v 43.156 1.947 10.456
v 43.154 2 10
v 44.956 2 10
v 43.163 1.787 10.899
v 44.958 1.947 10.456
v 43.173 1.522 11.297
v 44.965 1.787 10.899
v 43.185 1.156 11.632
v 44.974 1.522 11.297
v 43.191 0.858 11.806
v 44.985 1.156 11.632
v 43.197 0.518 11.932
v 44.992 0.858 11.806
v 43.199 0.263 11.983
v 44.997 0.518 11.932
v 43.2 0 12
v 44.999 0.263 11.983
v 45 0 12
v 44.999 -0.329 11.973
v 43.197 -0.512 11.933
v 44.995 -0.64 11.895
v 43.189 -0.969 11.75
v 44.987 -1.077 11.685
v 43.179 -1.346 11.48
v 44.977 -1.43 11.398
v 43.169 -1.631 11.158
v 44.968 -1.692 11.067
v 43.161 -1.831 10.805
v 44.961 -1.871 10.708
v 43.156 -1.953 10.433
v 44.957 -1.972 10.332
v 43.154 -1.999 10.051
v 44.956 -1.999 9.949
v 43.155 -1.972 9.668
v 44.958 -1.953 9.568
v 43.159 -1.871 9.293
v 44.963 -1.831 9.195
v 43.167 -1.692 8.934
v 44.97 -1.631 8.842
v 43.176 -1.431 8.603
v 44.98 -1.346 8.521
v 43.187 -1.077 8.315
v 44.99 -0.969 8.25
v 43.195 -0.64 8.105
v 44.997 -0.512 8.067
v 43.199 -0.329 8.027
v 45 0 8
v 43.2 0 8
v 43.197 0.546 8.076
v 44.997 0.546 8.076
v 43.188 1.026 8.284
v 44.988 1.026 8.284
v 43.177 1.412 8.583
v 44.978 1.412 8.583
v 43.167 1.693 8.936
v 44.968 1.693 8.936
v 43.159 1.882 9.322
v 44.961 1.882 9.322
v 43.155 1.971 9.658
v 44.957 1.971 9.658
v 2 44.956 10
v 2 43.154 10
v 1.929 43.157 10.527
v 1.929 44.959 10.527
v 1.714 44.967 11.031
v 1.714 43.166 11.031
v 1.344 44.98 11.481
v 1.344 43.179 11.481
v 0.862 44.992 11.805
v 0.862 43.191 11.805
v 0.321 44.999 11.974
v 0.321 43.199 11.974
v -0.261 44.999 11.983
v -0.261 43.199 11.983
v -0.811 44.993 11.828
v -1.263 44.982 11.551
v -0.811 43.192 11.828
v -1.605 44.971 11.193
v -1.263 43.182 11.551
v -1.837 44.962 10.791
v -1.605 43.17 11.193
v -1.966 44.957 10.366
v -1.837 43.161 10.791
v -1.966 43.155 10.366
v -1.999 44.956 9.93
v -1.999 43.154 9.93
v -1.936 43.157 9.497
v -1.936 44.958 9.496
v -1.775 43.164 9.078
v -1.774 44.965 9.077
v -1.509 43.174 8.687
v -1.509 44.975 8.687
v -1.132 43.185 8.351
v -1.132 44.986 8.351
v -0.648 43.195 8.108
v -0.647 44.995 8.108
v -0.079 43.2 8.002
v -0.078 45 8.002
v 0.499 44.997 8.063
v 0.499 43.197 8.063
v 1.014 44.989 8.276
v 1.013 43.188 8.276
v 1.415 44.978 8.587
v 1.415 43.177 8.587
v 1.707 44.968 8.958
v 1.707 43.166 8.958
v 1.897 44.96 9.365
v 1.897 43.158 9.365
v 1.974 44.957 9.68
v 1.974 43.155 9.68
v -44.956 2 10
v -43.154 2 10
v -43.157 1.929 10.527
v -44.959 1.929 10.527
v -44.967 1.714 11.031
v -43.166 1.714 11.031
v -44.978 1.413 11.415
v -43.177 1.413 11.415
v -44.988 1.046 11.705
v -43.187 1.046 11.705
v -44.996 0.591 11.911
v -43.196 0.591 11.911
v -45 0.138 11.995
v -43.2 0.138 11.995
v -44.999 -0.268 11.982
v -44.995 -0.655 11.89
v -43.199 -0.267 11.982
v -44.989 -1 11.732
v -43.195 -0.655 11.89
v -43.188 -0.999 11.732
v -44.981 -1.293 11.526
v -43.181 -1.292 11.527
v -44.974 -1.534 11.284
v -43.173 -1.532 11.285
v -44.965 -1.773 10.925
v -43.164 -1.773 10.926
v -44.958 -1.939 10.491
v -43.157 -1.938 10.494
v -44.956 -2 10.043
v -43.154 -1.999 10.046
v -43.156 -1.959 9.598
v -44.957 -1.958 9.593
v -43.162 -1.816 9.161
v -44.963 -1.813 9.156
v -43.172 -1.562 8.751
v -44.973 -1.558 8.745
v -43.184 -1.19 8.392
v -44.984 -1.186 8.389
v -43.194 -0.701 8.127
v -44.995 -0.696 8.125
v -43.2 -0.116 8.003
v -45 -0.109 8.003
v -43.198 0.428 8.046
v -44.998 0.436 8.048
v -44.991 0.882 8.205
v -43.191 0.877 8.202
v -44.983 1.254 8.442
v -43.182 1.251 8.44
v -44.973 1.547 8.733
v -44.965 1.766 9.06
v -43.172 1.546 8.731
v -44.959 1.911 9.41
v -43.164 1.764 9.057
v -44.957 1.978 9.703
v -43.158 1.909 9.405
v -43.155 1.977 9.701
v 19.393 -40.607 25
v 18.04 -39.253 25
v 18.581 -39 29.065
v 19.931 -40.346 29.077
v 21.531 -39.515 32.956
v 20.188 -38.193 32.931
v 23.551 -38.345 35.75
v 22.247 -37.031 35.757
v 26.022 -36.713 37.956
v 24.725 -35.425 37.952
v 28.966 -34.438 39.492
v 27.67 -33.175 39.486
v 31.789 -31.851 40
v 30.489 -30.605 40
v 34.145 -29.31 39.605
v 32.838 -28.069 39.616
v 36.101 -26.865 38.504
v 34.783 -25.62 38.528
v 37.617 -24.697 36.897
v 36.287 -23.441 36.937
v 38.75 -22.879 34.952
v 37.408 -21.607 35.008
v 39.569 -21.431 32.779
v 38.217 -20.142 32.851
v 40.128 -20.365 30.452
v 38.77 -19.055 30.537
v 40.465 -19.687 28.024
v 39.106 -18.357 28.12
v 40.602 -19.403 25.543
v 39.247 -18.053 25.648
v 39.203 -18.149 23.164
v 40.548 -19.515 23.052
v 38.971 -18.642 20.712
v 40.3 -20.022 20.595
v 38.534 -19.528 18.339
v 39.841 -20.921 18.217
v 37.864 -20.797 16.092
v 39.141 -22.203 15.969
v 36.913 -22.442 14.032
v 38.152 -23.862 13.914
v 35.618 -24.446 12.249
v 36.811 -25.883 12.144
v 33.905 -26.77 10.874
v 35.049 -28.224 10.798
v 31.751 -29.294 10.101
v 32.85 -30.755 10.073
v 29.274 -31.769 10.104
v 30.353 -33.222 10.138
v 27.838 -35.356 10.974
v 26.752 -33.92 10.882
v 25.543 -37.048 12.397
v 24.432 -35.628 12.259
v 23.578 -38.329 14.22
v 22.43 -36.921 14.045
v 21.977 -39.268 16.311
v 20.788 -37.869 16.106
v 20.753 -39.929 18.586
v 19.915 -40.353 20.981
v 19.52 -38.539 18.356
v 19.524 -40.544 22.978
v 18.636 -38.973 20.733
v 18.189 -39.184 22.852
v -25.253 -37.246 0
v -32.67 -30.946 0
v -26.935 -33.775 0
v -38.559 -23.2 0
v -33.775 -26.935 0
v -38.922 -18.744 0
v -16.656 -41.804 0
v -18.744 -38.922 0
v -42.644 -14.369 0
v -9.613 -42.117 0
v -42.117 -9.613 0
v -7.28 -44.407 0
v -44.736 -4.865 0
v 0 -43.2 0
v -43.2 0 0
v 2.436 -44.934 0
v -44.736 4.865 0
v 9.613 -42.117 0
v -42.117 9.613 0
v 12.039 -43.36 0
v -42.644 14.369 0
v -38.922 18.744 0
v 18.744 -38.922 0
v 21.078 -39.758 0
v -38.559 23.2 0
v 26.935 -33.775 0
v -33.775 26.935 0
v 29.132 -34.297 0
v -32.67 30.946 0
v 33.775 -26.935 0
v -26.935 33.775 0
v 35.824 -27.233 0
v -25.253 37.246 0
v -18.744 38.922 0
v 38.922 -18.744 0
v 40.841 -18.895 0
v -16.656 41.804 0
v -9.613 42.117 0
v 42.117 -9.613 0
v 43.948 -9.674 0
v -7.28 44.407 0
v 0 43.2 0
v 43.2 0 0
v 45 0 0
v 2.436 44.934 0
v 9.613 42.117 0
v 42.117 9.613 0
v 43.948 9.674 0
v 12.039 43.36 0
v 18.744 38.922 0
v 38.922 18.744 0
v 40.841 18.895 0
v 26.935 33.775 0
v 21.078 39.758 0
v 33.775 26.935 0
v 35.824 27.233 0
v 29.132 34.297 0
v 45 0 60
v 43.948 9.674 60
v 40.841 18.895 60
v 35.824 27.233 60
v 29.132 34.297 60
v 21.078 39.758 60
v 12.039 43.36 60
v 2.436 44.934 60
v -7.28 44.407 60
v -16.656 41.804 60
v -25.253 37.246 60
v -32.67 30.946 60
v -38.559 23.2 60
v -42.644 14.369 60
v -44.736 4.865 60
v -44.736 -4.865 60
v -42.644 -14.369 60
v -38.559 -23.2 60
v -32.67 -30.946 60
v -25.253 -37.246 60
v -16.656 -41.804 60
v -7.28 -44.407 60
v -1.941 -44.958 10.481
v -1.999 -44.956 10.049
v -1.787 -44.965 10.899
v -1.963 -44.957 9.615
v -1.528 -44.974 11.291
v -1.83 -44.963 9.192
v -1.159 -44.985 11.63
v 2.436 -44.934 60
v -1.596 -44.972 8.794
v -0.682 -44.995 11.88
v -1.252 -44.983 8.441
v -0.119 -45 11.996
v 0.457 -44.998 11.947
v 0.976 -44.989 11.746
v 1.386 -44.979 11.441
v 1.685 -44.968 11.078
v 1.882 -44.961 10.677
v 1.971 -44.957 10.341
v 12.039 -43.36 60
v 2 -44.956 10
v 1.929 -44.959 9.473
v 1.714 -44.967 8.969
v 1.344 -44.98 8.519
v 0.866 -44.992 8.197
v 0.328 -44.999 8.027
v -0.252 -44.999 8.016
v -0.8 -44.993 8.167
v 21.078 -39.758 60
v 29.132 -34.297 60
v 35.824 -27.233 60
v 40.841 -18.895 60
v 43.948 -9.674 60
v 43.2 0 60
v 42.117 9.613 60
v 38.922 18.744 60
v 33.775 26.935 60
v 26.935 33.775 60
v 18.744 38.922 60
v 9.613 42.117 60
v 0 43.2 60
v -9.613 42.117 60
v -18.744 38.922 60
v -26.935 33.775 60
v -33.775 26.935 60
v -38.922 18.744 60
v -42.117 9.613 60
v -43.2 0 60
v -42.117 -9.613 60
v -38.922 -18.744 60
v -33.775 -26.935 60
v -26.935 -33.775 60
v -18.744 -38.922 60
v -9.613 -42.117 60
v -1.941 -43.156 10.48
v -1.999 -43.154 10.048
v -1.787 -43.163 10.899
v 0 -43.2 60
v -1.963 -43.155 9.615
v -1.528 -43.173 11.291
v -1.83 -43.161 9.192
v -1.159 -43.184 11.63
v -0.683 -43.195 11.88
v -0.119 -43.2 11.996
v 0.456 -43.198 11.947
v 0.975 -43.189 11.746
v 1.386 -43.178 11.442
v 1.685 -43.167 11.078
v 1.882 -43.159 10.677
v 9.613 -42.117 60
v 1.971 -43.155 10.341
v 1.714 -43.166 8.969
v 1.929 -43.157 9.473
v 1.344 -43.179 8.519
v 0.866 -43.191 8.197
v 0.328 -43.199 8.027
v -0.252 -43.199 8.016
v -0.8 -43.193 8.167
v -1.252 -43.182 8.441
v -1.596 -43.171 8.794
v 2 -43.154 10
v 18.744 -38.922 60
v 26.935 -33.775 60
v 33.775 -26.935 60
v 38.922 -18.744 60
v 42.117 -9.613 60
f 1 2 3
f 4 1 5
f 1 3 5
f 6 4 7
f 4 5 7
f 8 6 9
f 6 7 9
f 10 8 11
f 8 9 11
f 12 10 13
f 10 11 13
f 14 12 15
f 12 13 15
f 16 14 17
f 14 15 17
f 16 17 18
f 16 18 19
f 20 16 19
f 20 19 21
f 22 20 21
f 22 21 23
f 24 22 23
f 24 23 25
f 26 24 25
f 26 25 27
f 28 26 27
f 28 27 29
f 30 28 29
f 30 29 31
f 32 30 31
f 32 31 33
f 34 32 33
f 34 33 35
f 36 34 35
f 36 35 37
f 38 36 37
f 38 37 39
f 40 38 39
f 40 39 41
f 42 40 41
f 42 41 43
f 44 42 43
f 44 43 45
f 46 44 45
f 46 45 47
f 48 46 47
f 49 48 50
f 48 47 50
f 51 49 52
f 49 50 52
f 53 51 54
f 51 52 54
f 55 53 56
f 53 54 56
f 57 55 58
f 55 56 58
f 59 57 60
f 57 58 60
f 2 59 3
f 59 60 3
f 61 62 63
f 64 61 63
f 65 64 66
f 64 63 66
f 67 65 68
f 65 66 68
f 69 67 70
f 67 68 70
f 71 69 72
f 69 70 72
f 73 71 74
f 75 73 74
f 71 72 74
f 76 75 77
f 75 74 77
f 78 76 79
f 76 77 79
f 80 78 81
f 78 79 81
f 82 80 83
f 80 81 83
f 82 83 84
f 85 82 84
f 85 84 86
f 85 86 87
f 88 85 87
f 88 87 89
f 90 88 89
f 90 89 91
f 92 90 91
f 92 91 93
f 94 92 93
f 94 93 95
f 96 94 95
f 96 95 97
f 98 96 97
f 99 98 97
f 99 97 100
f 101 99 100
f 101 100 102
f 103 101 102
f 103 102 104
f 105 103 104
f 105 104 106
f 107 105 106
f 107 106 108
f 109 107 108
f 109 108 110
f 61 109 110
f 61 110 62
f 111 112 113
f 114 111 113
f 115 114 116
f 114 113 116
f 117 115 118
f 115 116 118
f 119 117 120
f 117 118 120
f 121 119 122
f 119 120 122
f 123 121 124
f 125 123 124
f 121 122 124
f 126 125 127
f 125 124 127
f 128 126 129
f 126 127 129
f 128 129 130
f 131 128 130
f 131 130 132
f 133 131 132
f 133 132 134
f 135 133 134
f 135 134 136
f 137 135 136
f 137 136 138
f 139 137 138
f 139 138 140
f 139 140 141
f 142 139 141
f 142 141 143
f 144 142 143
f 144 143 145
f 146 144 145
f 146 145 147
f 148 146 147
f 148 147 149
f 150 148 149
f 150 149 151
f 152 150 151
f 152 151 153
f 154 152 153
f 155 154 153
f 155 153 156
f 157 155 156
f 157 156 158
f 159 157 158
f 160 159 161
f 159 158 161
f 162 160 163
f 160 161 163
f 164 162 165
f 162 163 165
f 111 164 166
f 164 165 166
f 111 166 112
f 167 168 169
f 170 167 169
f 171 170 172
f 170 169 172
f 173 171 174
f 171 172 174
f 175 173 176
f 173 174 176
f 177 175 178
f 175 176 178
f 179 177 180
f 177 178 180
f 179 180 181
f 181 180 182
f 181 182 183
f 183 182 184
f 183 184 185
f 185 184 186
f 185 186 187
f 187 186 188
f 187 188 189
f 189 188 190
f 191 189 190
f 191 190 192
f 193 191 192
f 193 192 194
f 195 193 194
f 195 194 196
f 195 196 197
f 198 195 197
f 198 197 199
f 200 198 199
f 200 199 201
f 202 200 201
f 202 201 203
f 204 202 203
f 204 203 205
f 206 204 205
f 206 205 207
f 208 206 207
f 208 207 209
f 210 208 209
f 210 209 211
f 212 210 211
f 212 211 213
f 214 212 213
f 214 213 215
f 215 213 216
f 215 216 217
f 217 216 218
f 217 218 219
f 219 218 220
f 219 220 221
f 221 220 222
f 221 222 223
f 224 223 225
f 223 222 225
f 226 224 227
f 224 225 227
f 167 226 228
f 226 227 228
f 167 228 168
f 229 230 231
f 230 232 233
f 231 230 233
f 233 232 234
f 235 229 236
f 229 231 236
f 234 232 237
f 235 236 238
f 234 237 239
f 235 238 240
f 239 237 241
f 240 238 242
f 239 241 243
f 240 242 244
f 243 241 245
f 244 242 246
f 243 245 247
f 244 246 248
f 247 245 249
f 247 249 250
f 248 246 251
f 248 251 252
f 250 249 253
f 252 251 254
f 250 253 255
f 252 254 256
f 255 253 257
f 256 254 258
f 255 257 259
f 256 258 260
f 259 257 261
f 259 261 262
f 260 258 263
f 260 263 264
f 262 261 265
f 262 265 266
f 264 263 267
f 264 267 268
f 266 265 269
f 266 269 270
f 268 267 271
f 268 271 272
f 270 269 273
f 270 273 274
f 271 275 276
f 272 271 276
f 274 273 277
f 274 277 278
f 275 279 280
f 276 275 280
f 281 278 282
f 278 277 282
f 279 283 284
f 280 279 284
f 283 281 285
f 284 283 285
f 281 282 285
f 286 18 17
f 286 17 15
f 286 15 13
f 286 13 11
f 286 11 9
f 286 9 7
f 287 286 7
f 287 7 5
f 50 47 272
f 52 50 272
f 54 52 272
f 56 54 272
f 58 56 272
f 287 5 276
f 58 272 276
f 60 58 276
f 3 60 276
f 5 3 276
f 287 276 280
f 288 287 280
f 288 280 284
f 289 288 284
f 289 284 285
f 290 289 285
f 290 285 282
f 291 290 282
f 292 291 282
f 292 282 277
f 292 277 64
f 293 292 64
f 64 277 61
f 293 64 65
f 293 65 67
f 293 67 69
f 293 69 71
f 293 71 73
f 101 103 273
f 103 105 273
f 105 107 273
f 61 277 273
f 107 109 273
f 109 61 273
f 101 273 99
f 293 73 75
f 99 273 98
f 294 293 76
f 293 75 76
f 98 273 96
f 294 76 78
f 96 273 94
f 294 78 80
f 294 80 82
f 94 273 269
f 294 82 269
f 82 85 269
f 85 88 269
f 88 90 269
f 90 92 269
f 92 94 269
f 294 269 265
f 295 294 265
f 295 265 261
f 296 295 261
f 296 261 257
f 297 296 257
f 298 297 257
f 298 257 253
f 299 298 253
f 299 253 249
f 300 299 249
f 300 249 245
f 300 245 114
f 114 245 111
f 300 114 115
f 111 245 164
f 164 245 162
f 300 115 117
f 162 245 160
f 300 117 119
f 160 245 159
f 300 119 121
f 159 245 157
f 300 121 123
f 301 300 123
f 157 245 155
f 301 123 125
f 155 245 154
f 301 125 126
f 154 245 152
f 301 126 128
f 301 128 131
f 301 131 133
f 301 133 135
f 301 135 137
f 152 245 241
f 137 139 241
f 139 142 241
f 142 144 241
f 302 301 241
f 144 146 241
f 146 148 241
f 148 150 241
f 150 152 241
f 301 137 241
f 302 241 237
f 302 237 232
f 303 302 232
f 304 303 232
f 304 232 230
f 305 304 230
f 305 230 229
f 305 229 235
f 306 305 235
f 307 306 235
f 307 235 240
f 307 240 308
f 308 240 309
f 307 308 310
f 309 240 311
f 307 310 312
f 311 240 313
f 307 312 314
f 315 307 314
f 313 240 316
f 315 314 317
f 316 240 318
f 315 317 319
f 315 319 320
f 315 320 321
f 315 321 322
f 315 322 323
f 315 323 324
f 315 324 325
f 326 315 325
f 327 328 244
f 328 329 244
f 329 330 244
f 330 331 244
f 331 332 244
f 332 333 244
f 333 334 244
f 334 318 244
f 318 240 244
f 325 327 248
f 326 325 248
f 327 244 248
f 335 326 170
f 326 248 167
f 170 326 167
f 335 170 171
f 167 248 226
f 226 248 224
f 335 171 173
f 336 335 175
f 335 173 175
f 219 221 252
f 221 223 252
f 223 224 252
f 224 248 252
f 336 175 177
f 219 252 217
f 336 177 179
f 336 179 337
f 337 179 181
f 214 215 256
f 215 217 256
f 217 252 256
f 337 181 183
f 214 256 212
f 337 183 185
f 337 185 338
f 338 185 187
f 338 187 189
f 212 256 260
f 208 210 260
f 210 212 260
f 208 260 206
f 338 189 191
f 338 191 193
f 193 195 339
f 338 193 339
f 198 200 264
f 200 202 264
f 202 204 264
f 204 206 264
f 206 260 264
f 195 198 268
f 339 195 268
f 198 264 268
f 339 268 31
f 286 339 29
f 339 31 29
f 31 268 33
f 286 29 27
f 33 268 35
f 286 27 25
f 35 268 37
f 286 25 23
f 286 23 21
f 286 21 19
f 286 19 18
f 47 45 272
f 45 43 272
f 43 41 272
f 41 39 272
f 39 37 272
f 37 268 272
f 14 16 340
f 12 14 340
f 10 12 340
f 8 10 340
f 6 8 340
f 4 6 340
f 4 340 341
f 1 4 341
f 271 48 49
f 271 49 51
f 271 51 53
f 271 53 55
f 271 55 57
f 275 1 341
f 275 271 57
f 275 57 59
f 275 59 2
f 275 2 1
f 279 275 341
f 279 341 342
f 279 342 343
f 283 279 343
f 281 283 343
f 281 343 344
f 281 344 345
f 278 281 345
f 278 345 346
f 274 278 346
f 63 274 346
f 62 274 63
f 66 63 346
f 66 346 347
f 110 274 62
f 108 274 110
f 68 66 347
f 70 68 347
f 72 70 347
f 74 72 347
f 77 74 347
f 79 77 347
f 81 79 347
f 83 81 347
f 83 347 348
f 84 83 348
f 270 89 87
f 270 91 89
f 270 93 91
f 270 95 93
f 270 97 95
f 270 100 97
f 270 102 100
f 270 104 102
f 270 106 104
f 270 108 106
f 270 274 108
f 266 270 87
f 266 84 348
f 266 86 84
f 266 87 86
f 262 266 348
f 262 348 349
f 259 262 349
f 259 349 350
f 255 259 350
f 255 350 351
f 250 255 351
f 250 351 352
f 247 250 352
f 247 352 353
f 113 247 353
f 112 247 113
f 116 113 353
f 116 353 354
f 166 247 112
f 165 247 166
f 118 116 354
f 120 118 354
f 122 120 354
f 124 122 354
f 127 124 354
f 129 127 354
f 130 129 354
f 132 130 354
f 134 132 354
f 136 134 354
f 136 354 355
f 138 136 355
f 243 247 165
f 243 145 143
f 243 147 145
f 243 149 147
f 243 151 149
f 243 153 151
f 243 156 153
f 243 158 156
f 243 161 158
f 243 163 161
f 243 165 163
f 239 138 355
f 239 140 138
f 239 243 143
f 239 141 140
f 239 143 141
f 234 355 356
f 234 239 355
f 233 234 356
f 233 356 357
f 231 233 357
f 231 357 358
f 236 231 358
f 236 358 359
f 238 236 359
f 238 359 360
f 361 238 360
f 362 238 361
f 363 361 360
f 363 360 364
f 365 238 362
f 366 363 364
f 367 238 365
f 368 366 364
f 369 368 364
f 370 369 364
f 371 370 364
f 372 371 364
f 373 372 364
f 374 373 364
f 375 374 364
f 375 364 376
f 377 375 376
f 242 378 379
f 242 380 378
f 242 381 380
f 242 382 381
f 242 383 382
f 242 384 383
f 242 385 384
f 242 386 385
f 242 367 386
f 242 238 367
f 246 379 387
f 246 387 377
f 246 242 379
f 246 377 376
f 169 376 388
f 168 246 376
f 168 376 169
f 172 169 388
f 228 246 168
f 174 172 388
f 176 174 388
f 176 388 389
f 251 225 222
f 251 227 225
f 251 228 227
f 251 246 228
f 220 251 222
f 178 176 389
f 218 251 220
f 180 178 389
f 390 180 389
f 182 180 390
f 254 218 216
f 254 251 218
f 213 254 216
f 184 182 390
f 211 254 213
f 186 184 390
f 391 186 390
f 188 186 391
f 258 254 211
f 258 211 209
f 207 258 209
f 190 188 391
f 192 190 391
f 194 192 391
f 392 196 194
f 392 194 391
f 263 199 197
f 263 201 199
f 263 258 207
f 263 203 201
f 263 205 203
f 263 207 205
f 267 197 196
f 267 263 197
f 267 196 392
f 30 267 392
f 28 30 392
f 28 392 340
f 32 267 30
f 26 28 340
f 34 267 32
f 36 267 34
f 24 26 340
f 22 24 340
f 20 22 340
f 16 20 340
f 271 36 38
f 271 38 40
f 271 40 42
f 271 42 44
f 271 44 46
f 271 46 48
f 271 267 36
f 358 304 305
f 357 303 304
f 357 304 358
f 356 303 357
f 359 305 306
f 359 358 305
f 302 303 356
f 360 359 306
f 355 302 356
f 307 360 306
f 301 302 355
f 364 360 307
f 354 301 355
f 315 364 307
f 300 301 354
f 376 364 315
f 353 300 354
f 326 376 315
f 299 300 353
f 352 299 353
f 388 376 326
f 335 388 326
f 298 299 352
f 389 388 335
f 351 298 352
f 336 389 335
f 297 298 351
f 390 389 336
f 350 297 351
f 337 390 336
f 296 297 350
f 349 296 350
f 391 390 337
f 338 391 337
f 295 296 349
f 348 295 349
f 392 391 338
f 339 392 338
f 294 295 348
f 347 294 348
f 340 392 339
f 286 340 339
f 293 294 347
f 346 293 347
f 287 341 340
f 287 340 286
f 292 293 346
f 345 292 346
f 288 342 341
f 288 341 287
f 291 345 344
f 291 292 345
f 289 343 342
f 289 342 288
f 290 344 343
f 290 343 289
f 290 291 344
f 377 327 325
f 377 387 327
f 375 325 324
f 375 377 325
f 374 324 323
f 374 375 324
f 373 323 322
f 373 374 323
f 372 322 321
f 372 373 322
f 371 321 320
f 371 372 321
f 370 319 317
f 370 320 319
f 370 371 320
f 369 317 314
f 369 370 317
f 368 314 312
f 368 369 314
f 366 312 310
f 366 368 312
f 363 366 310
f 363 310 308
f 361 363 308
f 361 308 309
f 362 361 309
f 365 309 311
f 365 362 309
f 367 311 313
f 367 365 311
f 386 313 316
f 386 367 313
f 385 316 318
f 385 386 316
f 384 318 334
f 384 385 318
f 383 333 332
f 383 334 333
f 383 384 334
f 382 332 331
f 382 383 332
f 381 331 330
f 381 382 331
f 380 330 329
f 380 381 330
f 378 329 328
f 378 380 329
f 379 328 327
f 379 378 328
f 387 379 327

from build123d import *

# Parameters (mm, degrees)
TUBE_R             = 45
TUBE_R_2           = 43.2
TUBE_DEPTH         = 60
SKETCH_R           = 2
POCKET_DEPTH       = 326.425946
POCKET_DEPTH_BACK  = 326.425946
POLARPATTERN_COUNT = 4
SKETCH003_R        = 15
POCKET001_DEPTH    = 63.64061


with BuildPart() as part:
    # Tube → Tube (new body)
    with BuildSketch(Plane.XY):
        Circle(TUBE_R)
        Circle(TUBE_R_2, mode=Mode.SUBTRACT)
    extrude(amount=TUBE_DEPTH)

    # Sketch → Pocket (cut, two sides)
    with BuildSketch(Plane.XZ) as pocket_sk:
        with Locations((0, 10)):
            Circle(SKETCH_R)
    pocket = extrude(amount=-POCKET_DEPTH, mode=Mode.SUBTRACT) + extrude(pocket_sk.sketch, amount=POCKET_DEPTH_BACK, mode=Mode.SUBTRACT)

    # PolarPattern: Pocket ×4 about axis
    polarpattern_axis = Axis((0, 0, 0), (0, 0, 1))
    for i in range(1, POLARPATTERN_COUNT):
        add(pocket.rotate(polarpattern_axis, i * 360 / POLARPATTERN_COUNT), mode=Mode.SUBTRACT)

    # Sketch003 → Pocket001 (cut, through all)
    with BuildSketch(Plane(origin=(0, 0, 0), x_dir=(-0.707107, -0.707107, 0), z_dir=(-0.707107, 0.707107, 0))):
        with Locations((0, 25)):
            Circle(SKETCH003_R)
    extrude(amount=-POCKET001_DEPTH, mode=Mode.SUBTRACT)


solid = part.part
